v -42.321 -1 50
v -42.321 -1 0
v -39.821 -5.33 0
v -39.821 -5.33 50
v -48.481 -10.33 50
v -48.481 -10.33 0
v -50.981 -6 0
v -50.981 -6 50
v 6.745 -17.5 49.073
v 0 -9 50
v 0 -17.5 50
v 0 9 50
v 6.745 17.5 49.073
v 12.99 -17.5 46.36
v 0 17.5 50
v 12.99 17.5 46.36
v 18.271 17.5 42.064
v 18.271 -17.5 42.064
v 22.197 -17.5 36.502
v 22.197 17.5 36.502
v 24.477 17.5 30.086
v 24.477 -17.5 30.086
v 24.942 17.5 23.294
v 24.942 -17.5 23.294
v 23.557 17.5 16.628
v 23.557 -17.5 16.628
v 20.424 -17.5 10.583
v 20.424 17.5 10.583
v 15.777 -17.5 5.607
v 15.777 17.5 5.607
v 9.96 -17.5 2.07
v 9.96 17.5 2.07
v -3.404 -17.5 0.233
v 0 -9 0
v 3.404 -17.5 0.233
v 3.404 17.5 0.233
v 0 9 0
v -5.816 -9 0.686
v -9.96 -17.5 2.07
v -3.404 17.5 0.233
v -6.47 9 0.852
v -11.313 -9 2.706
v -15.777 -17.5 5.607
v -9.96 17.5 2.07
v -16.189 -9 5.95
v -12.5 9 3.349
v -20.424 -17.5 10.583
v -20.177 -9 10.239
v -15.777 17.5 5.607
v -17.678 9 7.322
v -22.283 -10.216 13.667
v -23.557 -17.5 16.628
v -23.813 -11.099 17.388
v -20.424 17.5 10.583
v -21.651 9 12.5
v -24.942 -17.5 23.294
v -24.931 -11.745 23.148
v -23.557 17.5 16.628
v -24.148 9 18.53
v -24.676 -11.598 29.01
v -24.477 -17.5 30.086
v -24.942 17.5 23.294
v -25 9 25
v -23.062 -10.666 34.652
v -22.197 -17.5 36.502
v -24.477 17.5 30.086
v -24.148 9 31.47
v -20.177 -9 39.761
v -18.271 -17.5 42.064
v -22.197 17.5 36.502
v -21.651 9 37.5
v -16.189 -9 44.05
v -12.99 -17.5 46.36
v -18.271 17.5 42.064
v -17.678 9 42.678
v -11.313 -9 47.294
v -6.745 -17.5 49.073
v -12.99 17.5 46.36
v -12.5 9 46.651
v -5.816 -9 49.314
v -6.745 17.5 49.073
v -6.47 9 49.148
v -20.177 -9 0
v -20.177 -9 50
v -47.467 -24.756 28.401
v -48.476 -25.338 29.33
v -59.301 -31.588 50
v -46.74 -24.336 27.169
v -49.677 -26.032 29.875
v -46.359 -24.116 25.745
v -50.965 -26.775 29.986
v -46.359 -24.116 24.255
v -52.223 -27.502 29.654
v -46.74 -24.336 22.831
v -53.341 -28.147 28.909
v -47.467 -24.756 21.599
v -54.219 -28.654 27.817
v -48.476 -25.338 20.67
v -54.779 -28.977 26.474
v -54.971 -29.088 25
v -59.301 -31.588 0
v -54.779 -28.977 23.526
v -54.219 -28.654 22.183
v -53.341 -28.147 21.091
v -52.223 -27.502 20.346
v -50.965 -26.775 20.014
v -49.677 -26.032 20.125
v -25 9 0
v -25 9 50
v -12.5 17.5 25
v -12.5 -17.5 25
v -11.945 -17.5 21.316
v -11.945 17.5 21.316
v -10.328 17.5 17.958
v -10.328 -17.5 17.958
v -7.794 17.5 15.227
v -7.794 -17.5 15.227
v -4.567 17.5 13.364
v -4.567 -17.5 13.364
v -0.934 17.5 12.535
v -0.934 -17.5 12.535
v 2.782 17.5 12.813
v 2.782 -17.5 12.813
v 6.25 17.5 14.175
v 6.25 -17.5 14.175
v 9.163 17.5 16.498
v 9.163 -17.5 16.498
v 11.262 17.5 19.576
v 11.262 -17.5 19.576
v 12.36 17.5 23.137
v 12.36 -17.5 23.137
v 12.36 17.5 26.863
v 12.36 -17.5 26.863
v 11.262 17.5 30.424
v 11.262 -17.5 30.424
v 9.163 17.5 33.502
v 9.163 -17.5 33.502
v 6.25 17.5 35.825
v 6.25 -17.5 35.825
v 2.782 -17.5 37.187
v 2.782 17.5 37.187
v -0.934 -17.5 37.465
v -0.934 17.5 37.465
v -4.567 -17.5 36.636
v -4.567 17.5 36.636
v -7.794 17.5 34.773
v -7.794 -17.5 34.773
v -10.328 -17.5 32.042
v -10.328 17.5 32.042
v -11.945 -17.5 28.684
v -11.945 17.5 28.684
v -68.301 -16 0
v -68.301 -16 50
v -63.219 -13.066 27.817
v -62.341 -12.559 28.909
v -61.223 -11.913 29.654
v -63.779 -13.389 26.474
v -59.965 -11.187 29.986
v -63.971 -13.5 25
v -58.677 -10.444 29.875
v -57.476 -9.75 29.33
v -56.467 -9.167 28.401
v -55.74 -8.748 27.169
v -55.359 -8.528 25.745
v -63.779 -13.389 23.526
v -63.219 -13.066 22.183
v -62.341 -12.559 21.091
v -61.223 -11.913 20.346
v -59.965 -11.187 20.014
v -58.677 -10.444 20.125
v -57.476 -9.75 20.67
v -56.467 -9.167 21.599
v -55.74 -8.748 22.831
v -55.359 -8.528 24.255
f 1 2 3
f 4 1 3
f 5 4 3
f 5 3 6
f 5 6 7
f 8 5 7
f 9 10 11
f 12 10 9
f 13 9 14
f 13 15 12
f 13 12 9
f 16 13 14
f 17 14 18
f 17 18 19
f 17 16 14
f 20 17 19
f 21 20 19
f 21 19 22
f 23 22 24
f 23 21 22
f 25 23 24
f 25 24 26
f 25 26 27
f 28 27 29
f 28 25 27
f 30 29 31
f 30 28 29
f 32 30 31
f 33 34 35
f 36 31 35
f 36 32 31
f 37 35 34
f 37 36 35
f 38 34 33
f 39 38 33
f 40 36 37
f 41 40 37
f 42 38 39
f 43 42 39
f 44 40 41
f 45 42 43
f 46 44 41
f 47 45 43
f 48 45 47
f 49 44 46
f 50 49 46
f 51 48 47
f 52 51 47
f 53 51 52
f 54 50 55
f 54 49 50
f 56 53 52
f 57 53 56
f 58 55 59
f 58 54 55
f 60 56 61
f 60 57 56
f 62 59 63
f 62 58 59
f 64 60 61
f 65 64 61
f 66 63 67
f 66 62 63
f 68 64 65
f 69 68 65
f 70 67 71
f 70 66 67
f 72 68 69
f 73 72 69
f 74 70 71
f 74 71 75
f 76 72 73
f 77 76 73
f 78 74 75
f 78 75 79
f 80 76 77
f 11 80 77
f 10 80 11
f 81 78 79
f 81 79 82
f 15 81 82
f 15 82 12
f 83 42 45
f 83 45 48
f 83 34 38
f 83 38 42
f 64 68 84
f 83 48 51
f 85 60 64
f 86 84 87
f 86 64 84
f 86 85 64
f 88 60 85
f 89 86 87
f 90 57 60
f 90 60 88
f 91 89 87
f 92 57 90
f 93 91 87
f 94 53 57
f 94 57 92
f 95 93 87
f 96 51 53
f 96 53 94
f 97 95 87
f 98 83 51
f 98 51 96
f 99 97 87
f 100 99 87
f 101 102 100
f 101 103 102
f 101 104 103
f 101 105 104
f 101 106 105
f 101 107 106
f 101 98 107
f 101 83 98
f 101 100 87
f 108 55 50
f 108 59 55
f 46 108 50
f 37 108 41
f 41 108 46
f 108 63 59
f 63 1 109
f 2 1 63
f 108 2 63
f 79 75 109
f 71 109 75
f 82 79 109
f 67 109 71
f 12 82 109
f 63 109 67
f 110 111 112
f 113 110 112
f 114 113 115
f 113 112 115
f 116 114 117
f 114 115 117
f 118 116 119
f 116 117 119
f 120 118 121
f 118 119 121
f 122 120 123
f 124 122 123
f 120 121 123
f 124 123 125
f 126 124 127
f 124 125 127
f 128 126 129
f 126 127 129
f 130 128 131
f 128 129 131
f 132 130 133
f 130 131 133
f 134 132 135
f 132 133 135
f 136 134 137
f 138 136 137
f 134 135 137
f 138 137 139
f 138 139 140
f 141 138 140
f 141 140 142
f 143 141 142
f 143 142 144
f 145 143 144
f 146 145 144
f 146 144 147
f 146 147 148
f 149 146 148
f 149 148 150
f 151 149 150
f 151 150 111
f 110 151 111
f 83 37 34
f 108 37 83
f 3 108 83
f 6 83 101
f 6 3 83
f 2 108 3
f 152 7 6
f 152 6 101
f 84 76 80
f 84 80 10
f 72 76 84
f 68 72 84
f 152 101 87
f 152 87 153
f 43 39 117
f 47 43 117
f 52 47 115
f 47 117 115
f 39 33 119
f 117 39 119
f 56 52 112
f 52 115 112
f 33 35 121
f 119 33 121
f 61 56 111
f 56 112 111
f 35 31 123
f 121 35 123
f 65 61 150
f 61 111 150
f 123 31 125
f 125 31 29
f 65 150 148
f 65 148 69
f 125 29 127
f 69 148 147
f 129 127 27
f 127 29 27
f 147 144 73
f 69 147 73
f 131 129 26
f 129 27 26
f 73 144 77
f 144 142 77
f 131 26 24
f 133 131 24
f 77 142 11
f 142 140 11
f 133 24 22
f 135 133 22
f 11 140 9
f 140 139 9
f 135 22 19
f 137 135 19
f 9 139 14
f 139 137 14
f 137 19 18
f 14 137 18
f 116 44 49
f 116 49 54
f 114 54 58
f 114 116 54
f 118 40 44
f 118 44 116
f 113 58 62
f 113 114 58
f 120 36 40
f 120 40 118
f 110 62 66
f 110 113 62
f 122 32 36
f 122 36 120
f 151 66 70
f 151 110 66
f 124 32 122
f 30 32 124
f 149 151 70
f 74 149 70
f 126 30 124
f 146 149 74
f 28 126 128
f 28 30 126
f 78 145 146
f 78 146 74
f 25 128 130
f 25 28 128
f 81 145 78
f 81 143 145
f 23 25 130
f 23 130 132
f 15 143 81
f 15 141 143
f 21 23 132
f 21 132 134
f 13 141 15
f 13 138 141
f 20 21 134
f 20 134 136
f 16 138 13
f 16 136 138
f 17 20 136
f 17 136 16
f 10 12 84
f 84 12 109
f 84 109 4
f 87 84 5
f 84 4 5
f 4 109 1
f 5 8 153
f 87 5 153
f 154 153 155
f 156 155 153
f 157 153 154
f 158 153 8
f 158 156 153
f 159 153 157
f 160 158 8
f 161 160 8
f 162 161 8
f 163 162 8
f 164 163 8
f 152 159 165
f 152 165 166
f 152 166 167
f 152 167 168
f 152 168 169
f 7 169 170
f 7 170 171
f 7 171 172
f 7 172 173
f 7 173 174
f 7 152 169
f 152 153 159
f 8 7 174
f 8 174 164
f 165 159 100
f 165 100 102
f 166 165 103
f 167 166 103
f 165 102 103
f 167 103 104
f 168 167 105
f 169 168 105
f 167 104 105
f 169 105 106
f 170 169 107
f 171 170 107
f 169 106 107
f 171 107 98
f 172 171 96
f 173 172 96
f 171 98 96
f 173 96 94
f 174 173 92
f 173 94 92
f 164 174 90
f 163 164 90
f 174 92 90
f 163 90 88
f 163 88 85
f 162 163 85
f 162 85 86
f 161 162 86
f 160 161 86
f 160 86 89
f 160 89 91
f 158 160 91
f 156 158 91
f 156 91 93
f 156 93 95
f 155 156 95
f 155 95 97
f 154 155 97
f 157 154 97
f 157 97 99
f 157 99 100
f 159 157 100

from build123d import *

# Parameters (mm, degrees)
BOSS_EXTRUDE1_DEPTH = 50
SKETCH3_R           = 25
BOSS_EXTRUDE2_DEPTH = 17.5
HOLE1_D             = 25
HOLE2_D             = 10
CUT_EXTRUDE1_DEPTH  = 91.34873625


with BuildPart() as part:
    # Sketch1 → Boss-Extrude1 (new body)
    with BuildSketch(Plane.XY):
        Polygon((0, 9), (0, -9), (-20.176914536, -9), (-59.301270189, -31.588457268), (-68.301270189, -16), (-25, 9), align=None)
    extrude(amount=BOSS_EXTRUDE1_DEPTH)

    # Sketch3 → Boss-Extrude2 (add, symmetric)
    with BuildSketch(Plane(origin=(0, 0, 0), x_dir=(1, 0, 0), z_dir=(0, 1, 0))):
        with Locations(Location((0, -25, 0), (0, 0, 270))):
            Circle(SKETCH3_R)
    extrude(amount=BOSS_EXTRUDE2_DEPTH, both=True)

    # Hole1 (through all)
    with Locations(Plane(origin=(0, 17.5, 0), x_dir=(1, 0, 0), z_dir=(0, 1, 0))):
        with Locations((0, -25)):
            Hole(HOLE1_D / 2)

    # Hole2 (through all)
    with Locations(Plane(origin=(-10.147114317, 17.575317547, 0), x_dir=(0.8660254037844378, 0.5000000000000017, 0), z_dir=(-0.5000000000000016, 0.8660254037844377, 0))):
        with Locations((-57.150635095, -25)):
            Hole(HOLE2_D / 2)

    # Sketch9 → Cut-Extrude1 (cut, through all)
    with BuildSketch(Plane.XY.offset(50)):
        Polygon((-50.980762114, -6), (-42.320508076, -1), (-39.820508076, -5.330127019), (-48.480762114, -10.330127019), align=None)
    extrude(amount=-CUT_EXTRUDE1_DEPTH, mode=Mode.SUBTRACT)


solid = part.part
